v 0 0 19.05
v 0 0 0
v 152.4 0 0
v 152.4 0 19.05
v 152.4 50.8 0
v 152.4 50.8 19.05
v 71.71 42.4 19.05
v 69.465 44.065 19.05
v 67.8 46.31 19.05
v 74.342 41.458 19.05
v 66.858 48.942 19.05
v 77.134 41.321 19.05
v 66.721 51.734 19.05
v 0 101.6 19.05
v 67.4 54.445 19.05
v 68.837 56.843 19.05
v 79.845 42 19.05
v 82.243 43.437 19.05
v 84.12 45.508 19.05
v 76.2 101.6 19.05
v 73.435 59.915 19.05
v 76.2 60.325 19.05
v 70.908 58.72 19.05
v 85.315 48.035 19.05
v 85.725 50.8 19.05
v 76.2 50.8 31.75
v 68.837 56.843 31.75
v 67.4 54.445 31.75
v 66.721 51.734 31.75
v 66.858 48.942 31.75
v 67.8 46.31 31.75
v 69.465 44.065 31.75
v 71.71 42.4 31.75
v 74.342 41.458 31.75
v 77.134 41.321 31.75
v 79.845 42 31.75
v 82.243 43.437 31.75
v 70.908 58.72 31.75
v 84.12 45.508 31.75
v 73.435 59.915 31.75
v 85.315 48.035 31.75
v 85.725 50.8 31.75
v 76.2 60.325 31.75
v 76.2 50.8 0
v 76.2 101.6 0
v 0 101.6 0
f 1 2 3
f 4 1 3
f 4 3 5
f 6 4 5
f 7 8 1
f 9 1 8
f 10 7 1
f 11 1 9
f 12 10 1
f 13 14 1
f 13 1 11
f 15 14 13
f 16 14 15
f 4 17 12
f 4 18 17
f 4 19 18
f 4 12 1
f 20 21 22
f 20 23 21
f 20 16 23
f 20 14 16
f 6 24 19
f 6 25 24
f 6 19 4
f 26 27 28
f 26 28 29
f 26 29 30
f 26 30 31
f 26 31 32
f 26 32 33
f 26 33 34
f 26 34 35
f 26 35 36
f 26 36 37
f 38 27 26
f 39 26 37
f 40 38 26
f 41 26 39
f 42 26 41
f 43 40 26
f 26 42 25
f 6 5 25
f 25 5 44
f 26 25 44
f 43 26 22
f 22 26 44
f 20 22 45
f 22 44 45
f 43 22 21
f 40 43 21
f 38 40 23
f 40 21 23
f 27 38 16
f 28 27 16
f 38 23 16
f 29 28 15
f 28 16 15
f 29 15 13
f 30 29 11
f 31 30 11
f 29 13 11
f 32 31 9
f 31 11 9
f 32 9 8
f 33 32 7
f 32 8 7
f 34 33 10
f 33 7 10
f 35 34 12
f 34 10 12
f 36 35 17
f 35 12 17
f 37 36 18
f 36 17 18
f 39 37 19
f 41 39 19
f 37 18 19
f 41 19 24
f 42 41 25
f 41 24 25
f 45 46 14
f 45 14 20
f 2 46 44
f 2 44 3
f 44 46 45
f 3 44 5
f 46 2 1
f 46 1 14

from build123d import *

# Parameters (mm, degrees)
SKETCH1_W               = 152.4
SKETCH1_H               = 101.6
BOSS_EXTRUDE1_DEPTH     = 19.05
CUT_EXTRUDE1_DEPTH      = 185.15
CUT_EXTRUDE1_DEPTH_BACK = 185.15
SKETCH4_W               = 76.2
SKETCH4_H               = 50.8
BOSS_EXTRUDE2_DEPTH     = 12.7


with BuildPart() as part:
    # Sketch1 → Boss-Extrude1 (new body)
    with BuildSketch(Plane.XY):
        with Locations((76.2, 50.8)):
            Rectangle(SKETCH1_W, SKETCH1_H)
    extrude(amount=BOSS_EXTRUDE1_DEPTH)

    # Sketch4 → Cut-Extrude1 (cut, two sides: drawn at the far end of the back side and taken through both)
    with BuildSketch(Plane.XY.offset(19.05).offset(-CUT_EXTRUDE1_DEPTH_BACK)):
        with Locations((114.3, 76.2)):
            Rectangle(SKETCH4_W, SKETCH4_H)
    extrude(amount=CUT_EXTRUDE1_DEPTH + CUT_EXTRUDE1_DEPTH_BACK, mode=Mode.SUBTRACT)

    # Sketch4<4> → Boss-Extrude2 (add)
    with BuildSketch(Plane.XY.offset(19.05)):
        with BuildLine():
            Line((76.2, 50.8), (76.2, 60.325))
            ThreePointArc((76.2, 60.325), (69.464807909, 44.064807909), (85.725, 50.8))
            Line((85.725, 50.8), (76.2, 50.8))
        make_face()
    extrude(amount=BOSS_EXTRUDE2_DEPTH)


solid = part.part
